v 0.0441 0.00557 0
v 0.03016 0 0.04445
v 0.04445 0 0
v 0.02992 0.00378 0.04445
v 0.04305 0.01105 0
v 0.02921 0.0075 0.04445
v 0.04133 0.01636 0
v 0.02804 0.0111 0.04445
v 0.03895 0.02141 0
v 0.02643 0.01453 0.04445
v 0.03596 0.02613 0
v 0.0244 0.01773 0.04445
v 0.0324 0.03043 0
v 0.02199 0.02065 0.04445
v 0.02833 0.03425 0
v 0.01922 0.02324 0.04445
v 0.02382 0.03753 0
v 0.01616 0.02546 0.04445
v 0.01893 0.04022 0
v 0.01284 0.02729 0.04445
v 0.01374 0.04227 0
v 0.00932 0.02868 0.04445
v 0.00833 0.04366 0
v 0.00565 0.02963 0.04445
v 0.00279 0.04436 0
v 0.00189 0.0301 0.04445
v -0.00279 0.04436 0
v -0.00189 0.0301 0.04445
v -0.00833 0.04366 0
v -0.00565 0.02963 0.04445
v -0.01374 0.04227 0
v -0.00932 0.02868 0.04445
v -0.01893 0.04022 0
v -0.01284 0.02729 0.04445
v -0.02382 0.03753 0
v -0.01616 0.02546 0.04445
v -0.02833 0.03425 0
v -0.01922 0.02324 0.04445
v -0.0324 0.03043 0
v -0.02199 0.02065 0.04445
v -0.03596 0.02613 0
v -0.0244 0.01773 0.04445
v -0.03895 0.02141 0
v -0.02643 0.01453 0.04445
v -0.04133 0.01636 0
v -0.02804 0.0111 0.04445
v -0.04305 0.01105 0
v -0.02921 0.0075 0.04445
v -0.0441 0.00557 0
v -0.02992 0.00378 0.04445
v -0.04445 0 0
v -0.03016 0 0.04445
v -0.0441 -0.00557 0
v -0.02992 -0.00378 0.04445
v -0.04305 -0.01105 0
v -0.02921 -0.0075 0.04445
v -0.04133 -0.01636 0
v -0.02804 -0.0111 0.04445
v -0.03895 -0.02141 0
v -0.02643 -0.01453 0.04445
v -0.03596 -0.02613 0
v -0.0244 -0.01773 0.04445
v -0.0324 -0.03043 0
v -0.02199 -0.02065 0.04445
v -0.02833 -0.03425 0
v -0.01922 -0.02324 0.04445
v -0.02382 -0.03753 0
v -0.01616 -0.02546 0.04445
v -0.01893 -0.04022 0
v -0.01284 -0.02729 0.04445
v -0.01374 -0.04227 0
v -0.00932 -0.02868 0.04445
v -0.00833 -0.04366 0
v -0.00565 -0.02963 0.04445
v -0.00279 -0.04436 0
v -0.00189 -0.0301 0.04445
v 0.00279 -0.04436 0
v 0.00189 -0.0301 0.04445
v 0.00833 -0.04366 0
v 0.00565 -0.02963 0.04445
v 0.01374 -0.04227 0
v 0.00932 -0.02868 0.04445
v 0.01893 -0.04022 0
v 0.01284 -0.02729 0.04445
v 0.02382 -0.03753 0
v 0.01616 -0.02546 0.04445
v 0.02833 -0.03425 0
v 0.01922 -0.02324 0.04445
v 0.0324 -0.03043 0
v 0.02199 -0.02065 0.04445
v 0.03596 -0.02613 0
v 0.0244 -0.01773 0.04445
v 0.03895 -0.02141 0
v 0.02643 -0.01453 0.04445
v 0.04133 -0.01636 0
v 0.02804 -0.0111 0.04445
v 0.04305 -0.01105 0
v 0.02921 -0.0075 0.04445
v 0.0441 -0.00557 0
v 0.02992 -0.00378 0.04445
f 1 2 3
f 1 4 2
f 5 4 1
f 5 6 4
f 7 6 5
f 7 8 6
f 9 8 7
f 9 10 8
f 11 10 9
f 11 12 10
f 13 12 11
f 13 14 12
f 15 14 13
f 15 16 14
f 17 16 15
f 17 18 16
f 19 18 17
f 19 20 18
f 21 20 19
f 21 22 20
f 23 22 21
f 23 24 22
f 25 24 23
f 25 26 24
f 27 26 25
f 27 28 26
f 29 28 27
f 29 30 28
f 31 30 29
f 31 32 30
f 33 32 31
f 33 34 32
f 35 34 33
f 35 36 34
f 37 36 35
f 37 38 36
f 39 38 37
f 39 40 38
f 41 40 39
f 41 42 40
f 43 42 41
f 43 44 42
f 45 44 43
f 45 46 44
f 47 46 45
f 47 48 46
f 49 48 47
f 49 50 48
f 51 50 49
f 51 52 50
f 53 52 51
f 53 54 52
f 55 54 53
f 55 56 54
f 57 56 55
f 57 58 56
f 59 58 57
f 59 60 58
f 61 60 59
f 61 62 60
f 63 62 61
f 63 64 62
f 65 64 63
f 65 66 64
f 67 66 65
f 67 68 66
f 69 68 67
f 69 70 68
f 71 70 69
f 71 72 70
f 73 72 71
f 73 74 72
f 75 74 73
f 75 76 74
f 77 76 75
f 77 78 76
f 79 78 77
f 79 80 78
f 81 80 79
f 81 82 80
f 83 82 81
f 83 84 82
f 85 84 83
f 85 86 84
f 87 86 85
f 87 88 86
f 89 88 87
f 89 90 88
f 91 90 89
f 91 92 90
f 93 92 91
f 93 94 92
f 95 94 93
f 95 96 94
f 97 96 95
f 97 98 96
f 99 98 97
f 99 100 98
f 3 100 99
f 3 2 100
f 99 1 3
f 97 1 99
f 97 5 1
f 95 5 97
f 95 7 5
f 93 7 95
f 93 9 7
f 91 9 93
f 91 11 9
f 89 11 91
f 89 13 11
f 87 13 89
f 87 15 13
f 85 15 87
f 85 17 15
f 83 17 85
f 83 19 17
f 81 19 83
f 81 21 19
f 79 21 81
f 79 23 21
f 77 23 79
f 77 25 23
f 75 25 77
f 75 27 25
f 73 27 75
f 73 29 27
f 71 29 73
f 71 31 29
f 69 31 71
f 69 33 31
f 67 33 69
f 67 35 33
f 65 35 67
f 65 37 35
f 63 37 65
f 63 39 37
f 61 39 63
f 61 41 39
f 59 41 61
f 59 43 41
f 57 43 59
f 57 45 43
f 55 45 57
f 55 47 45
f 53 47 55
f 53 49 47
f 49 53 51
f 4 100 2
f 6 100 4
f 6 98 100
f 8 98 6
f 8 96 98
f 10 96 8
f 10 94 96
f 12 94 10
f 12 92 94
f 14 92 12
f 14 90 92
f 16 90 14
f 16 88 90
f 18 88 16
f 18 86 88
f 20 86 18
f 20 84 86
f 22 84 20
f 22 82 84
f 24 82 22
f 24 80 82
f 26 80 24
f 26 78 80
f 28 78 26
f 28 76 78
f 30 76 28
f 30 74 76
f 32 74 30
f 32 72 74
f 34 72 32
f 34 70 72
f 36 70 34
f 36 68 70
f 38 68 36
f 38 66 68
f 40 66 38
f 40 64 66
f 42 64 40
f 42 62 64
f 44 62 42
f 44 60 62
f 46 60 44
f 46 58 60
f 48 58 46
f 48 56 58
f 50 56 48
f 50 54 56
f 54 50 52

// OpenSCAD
$fn=50;  // REMOVE
LENGTH = 0; // REMOVE
DO = 0.0889; // REMOVE
WALLTHICKNESS = 0.00391; // REMOVE
PARAM1 = 1.28; // REMOVE
PARAM2 = 0; // REMOVE
ANGLE_VERTICAL = 90; // REMOVE
ANGLE_AZIMUTHAL = 0; // REMOVE
ANGLE_AXIS = 0; // REMOVE
COORDS1_LOC = [0.0000,0.0000,0.0000]; // REMOVE
C1_DO = 0.0889; // REMOVE
C1_ANGLE_VERTICAL = 90; // REMOVE
C1_ANGLE_AZIMUTHAL = 0; // REMOVE
C1_ANGLE_AXIS = 0; // REMOVE
C2_DO = 0.06032; // REMOVE
C2_ANGLE_VERTICAL = 90; // REMOVE
C2_ANGLE_AZIMUTHAL = 0; // REMOVE
C2_ANGLE_AXIS = 0; // REMOVE
rotate([(C1_ANGLE_AXIS),-1*(C1_ANGLE_VERTICAL),-1*(C1_ANGLE_AZIMUTHAL)])
rotate([0, 90, 0])
translate([0, 0, ((C1_DO)>(C2_DO))?(C1_DO)/4:-(C1_DO)/4])
cylinder(h = max((C1_DO),(C2_DO))/2, r1 = (C1_DO)/2, r2 = (C2_DO)/2, center = true);
